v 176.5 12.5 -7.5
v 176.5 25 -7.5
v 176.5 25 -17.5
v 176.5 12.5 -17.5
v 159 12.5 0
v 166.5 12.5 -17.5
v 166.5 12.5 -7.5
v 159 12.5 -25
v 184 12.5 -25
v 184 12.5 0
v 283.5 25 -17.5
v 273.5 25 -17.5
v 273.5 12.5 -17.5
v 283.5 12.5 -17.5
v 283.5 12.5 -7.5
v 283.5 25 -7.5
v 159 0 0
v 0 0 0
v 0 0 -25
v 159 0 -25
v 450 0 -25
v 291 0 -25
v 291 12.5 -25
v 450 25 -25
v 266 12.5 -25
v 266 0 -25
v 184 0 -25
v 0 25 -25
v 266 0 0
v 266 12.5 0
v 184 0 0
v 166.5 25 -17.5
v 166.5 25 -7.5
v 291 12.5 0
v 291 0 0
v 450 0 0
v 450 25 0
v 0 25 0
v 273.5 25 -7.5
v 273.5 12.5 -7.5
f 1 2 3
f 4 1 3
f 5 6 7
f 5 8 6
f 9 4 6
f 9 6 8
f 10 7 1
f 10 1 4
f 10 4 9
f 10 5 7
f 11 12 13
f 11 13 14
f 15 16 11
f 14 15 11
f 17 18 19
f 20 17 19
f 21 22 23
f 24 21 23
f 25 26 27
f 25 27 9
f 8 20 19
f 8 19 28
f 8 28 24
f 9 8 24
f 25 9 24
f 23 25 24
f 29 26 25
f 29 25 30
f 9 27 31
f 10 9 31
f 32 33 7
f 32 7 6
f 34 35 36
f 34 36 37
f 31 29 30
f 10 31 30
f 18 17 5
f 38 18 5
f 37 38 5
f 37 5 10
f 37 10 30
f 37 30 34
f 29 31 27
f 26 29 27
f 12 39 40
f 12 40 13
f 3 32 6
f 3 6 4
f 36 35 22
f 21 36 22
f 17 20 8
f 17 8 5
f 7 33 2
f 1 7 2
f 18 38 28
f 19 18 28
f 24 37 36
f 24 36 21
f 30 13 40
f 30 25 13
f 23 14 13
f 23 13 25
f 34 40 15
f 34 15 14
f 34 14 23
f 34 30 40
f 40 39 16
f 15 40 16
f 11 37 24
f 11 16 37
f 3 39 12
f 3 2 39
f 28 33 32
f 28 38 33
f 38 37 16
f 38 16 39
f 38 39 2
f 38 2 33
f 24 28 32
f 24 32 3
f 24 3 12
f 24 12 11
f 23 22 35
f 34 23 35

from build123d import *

# Parameters (mm, degrees)
SKETCH1_W           = 25
SKETCH1_H           = 25
BOSS_EXTRUDE1_DEPTH = 450
SKETCH2_W           = 10
SKETCH2_H           = 10
CUT_EXTRUDE1_DEPTH  = 452.386752132
SKETCH3_W           = 25
SKETCH3_H           = 25
CUT_EXTRUDE2_DEPTH  = 12.5


with BuildPart() as part:
    # Sketch1 → Boss-Extrude1 (new body)
    with BuildSketch(Plane(origin=(0, 0, 0), x_dir=(0, 0, -1), z_dir=(1, 0, 0))):
        with Locations((12.5, 12.5)):
            Rectangle(SKETCH1_W, SKETCH1_H)
    extrude(amount=BOSS_EXTRUDE1_DEPTH)

    # Sketch2 → Cut-Extrude1 (cut, through all)
    with BuildSketch(Plane(origin=(0, 25, 0), x_dir=(1, 0, 0), z_dir=(0, 1, 0))):
        with Locations((278.5, 12.5)):
            Rectangle(SKETCH2_W, SKETCH2_H)
        with Locations((171.5, 12.5)):
            Rectangle(SKETCH2_W, SKETCH2_H)
    extrude(amount=-CUT_EXTRUDE1_DEPTH, mode=Mode.SUBTRACT)

    # Sketch3 → Cut-Extrude2 (cut)
    with BuildSketch(Plane.XZ):
        with Locations((278.5, -12.5)):
            Rectangle(SKETCH3_W, SKETCH3_H)
        with Locations((171.5, -12.5)):
            Rectangle(SKETCH3_W, SKETCH3_H)
    extrude(amount=-CUT_EXTRUDE2_DEPTH, mode=Mode.SUBTRACT)


solid = part.part
